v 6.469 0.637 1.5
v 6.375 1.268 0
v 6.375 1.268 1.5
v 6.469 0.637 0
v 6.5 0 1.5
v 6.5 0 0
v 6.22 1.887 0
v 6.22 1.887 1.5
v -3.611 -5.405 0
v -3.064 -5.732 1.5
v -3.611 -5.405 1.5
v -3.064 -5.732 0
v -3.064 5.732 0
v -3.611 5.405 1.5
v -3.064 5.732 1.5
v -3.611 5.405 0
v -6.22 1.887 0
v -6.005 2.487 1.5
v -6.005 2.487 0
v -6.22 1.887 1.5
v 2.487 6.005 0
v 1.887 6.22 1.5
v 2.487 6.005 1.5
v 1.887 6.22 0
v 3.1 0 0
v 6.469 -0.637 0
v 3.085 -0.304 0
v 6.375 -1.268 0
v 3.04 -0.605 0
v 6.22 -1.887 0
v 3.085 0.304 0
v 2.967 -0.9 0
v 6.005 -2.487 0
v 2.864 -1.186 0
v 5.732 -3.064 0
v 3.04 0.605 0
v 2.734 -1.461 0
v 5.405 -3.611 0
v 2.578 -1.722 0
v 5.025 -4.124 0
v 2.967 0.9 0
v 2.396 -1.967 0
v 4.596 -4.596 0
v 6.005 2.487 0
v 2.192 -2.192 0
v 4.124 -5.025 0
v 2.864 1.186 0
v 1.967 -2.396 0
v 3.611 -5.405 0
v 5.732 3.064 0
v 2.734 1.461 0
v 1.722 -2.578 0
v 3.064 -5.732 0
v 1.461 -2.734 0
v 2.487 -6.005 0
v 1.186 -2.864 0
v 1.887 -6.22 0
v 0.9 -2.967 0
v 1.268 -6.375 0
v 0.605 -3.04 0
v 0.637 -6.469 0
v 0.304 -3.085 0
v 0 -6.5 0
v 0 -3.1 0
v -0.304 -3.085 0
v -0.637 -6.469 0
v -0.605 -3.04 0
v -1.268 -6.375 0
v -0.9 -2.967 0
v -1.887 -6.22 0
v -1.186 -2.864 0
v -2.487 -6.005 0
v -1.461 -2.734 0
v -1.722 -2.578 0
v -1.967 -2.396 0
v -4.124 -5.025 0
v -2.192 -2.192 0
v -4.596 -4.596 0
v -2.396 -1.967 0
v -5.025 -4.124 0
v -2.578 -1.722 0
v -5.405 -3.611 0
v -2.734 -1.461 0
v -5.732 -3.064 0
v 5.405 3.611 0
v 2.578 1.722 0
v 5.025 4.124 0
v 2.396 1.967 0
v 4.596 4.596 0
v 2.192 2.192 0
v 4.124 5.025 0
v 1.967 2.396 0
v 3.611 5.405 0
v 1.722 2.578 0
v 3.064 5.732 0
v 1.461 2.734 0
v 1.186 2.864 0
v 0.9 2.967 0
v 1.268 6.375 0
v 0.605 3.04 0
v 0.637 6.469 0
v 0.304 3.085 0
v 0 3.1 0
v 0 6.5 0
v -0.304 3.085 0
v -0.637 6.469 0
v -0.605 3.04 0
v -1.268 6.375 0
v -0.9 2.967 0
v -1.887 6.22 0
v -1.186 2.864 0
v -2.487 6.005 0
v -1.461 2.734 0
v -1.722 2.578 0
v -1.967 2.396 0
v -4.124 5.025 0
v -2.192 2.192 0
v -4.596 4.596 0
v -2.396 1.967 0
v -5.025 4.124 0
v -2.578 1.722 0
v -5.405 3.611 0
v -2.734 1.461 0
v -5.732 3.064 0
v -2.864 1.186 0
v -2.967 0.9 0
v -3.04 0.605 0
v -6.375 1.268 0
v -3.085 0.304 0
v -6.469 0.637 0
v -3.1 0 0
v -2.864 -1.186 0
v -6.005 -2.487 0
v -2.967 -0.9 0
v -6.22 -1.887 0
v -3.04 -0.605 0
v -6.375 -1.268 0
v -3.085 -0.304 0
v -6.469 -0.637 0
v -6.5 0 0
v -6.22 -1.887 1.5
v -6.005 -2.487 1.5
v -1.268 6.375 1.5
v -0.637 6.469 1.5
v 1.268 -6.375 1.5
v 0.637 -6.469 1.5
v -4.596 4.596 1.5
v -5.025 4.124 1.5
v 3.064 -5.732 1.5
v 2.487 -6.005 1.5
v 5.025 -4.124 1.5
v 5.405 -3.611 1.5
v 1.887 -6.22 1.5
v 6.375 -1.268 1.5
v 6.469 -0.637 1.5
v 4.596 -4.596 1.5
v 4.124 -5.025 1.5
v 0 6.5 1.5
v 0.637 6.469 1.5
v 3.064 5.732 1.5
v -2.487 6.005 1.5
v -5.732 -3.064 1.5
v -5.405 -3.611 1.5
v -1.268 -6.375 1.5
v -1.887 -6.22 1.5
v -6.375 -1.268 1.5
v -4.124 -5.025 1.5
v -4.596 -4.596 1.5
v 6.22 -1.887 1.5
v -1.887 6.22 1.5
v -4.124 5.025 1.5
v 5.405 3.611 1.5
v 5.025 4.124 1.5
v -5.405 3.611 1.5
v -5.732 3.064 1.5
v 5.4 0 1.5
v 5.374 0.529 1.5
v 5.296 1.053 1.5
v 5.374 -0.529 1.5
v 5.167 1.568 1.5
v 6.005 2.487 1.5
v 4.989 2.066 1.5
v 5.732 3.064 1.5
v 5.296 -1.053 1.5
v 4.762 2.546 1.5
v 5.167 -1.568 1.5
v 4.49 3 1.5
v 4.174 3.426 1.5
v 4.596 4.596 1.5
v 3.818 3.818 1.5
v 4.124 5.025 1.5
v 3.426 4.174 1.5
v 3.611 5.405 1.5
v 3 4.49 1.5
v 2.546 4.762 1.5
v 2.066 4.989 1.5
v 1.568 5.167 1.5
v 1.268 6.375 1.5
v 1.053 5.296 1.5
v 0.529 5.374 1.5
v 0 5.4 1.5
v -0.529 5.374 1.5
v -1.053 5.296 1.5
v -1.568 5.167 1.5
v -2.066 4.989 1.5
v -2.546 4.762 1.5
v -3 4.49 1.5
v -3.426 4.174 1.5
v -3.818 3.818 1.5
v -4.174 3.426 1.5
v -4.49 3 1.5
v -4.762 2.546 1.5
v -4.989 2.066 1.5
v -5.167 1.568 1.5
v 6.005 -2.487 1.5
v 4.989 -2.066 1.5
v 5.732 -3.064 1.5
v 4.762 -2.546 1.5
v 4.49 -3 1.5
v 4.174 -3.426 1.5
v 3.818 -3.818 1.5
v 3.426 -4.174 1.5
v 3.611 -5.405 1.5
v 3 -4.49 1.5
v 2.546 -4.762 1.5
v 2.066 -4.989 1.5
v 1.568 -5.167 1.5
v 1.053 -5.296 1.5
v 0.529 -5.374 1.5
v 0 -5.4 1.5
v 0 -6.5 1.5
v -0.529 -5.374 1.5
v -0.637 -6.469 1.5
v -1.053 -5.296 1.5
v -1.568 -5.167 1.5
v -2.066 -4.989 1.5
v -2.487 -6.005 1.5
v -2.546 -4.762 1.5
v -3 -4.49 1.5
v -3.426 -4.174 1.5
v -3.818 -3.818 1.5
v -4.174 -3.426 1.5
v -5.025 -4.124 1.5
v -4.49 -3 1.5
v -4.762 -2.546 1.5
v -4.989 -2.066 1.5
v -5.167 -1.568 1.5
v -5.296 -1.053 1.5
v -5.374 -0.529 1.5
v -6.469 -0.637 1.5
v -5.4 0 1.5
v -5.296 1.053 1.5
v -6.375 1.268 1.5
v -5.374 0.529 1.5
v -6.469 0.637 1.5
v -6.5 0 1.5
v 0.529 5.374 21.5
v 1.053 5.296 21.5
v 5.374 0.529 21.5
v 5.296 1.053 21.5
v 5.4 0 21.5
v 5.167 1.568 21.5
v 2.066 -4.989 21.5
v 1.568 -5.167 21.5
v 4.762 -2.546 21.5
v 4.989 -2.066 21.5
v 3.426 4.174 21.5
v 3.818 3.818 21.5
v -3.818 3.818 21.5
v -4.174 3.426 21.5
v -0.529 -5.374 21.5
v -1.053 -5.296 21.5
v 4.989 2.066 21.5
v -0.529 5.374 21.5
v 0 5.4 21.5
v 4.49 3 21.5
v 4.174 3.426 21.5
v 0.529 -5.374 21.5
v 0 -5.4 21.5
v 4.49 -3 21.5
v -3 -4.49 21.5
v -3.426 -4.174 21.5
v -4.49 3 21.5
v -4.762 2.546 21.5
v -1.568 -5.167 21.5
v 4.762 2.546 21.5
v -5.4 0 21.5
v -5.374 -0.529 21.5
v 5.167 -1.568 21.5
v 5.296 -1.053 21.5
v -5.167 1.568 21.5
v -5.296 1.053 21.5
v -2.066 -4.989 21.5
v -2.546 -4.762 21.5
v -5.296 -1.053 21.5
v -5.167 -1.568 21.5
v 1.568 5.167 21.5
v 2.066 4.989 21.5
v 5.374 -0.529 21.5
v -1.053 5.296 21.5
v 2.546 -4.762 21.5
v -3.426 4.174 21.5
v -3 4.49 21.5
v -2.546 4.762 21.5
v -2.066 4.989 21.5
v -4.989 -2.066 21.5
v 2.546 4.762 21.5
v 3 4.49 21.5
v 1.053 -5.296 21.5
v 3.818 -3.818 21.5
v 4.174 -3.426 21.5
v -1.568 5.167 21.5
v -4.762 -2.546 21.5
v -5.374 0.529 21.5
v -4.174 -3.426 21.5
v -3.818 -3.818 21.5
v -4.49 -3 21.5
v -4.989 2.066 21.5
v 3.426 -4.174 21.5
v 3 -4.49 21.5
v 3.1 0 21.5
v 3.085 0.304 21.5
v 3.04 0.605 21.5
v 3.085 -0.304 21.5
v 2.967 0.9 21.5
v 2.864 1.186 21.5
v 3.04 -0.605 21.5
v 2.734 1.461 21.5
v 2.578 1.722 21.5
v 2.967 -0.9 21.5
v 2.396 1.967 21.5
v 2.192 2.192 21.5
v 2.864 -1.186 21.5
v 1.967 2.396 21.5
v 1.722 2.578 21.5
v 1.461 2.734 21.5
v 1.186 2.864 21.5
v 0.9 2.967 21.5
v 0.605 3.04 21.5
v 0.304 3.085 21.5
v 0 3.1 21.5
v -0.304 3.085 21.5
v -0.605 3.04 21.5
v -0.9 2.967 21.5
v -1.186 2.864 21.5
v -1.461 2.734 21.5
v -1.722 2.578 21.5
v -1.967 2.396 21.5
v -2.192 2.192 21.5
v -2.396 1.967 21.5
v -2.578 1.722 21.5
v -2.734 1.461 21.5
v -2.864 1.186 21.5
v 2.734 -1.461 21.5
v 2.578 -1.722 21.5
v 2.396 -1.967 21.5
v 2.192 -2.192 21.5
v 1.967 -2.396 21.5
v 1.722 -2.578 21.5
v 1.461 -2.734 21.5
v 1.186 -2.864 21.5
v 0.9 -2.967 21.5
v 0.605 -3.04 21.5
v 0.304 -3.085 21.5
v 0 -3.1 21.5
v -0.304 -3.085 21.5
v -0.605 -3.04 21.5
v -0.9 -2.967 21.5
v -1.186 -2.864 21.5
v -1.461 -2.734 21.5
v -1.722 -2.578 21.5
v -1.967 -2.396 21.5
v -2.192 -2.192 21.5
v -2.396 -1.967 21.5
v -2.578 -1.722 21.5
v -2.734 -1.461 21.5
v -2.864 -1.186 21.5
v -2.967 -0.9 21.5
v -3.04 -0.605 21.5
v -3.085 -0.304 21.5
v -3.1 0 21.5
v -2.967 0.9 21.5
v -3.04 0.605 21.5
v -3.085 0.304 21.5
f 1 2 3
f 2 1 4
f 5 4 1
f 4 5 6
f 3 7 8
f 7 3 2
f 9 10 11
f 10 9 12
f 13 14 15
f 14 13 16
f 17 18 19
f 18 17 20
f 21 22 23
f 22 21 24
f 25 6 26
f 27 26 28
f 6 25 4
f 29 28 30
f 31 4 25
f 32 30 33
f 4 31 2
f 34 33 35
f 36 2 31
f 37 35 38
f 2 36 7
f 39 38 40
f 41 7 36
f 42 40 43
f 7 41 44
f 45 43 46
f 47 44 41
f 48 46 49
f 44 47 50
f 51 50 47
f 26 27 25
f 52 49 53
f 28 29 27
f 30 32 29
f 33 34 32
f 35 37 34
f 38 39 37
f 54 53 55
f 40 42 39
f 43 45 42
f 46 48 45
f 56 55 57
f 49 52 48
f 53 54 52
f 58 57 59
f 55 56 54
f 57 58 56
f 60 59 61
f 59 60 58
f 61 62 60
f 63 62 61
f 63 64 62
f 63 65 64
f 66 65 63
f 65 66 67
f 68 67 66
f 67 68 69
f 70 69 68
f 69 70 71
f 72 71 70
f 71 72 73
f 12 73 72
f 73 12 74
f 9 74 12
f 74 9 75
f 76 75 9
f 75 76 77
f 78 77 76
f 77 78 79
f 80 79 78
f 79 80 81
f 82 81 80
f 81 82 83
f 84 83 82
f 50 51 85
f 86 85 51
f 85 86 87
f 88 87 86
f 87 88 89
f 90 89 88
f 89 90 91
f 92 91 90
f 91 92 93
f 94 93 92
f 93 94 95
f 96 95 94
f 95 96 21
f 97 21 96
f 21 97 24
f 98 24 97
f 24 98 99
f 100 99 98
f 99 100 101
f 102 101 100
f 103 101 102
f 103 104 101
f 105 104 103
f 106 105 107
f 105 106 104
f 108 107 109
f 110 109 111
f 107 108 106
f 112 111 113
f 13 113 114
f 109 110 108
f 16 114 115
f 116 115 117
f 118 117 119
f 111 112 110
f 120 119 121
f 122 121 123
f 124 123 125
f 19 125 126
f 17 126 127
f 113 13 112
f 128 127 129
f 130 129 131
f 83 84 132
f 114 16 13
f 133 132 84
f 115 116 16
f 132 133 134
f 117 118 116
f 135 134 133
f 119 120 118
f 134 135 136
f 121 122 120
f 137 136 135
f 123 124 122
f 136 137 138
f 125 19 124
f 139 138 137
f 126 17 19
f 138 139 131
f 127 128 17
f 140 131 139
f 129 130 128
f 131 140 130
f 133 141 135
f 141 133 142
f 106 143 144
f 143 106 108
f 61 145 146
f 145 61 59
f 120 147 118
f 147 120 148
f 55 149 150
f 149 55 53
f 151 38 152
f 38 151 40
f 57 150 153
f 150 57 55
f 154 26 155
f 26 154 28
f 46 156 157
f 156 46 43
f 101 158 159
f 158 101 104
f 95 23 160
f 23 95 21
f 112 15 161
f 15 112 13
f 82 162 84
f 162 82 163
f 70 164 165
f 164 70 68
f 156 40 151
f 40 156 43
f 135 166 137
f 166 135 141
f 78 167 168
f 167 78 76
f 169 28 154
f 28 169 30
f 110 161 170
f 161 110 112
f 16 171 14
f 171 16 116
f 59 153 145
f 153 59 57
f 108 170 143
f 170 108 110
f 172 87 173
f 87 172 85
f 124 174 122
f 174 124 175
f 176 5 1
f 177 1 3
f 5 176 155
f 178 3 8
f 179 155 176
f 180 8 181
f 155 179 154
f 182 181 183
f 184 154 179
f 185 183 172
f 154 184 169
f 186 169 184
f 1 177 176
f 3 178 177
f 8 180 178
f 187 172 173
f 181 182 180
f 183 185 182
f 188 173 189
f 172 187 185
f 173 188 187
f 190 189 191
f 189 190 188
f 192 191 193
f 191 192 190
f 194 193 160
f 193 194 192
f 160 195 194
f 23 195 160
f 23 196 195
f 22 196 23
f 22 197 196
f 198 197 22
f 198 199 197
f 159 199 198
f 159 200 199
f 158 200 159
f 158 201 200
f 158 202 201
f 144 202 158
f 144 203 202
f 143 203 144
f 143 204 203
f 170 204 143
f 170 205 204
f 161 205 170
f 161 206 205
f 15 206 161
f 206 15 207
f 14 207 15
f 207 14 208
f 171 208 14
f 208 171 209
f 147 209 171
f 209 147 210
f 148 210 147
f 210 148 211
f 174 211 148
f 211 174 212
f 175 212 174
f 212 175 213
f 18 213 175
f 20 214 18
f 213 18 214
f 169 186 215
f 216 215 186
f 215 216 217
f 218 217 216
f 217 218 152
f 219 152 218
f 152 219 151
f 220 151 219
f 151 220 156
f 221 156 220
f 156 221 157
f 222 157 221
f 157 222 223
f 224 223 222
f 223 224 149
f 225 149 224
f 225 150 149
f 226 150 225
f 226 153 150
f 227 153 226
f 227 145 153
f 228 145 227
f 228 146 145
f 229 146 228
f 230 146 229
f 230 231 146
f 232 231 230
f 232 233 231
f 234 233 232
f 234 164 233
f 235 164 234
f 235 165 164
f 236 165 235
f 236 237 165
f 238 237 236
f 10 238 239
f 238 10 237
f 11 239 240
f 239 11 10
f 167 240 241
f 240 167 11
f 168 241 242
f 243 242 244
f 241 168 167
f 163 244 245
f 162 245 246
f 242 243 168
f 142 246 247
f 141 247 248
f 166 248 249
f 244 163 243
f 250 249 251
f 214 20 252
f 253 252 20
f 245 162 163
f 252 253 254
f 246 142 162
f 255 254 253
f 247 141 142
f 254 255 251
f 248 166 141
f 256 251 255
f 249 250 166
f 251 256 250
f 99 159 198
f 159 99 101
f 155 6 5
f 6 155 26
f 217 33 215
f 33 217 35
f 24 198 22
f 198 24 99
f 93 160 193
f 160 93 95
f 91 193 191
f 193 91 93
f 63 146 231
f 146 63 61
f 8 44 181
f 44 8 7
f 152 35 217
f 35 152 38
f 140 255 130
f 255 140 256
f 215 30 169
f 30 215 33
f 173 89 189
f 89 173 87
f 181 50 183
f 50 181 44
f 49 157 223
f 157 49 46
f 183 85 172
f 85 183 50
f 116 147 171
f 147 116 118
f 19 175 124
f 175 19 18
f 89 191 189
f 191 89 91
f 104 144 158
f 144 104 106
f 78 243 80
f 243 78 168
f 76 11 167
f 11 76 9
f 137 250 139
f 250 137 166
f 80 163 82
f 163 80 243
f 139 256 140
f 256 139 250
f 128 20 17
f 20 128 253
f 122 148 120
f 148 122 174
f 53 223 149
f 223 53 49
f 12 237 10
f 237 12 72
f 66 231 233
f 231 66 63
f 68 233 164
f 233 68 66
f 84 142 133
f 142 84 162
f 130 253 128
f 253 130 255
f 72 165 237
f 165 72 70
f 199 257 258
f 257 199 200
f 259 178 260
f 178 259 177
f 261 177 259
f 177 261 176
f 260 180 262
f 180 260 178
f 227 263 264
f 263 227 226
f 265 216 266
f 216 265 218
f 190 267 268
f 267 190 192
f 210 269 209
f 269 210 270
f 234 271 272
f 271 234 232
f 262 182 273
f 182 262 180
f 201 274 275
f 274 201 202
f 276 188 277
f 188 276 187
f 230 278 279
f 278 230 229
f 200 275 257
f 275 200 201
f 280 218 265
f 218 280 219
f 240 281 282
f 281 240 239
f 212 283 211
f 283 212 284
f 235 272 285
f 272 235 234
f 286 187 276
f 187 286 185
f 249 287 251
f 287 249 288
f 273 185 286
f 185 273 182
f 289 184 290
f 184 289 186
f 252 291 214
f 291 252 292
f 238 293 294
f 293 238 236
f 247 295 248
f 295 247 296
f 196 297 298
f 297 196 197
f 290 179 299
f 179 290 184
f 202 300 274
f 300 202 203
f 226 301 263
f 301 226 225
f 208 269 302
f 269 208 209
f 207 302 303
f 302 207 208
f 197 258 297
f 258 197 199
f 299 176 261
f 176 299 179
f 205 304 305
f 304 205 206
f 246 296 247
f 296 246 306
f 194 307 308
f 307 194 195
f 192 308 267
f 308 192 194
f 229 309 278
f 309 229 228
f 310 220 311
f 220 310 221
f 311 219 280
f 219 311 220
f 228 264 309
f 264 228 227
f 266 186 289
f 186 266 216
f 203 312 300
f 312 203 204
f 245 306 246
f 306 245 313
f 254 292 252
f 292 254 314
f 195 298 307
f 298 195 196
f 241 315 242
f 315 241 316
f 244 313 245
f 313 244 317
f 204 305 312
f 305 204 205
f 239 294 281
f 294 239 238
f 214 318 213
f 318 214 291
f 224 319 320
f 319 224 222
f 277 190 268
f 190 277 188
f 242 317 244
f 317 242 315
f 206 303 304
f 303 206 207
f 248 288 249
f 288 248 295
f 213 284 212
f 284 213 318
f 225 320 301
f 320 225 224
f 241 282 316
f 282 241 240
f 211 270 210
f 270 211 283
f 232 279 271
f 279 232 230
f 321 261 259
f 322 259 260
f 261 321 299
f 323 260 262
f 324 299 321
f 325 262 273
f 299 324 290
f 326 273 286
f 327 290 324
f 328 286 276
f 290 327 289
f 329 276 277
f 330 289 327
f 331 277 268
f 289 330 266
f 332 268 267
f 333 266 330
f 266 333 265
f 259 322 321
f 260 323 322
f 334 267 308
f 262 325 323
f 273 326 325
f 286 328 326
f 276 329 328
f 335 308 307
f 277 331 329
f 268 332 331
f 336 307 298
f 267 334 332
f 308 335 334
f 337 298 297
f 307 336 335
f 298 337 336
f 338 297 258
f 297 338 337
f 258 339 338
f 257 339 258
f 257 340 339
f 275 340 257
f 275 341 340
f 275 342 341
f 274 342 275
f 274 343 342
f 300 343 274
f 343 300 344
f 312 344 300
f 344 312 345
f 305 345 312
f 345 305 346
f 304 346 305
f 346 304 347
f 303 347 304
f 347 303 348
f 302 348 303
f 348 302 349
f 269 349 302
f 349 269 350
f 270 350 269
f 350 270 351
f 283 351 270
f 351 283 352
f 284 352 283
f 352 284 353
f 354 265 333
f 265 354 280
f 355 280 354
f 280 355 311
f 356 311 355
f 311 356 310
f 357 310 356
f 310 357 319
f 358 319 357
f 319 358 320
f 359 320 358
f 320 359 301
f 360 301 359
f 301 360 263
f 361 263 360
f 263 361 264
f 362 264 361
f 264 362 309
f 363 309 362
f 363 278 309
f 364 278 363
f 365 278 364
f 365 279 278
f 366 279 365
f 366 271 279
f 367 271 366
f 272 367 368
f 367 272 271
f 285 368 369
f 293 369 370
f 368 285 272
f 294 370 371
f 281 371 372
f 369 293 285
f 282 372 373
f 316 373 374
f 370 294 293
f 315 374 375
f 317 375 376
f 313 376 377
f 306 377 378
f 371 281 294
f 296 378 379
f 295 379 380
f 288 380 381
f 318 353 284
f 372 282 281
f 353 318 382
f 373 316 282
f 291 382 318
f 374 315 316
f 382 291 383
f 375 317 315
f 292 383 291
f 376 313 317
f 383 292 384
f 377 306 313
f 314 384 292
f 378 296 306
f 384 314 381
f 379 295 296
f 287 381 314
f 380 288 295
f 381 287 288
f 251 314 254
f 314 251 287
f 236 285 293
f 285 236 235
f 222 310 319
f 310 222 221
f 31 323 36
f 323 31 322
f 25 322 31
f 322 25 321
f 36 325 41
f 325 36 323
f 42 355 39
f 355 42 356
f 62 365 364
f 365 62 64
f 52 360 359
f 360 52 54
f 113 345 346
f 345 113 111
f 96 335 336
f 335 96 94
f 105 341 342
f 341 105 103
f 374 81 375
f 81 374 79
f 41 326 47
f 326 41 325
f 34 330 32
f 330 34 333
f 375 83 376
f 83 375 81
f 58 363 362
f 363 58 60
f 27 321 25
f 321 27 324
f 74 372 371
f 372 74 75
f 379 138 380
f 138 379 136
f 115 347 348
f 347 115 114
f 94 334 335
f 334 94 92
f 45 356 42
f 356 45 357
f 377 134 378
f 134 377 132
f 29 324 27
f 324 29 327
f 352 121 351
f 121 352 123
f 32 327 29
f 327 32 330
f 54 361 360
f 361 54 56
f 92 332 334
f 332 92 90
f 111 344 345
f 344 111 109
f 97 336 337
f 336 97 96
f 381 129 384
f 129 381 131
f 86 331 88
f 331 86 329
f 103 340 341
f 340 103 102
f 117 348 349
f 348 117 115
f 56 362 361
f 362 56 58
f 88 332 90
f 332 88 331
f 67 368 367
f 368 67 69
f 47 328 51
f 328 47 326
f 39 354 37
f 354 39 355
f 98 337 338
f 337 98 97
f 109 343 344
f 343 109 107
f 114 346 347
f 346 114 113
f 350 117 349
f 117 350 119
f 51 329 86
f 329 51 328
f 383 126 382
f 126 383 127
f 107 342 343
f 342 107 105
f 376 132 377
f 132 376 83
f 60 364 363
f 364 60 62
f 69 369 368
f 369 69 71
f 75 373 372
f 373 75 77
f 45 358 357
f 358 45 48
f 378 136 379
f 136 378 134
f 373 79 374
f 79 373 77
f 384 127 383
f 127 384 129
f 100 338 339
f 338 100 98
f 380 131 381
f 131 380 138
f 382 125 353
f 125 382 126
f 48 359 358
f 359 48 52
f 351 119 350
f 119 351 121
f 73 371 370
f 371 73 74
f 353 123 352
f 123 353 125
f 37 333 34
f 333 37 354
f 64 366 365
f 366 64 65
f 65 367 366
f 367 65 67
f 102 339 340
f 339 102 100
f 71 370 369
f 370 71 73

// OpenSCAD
// Adapter sleeve: 0.2 mL PCR tube for a 1.5 mL tube rack hole
// Print orientation: collar down on the bed (z = 0), sleeve up (+Z)

$fn = 64;

// ---- Dimensions (mm) ----
collar_d      = 13;    // collar outer diameter
collar_h      = 1.5;   // collar thickness (z = 0 to 1.5)
sleeve_od     = 10.8;  // sleeve body outer diameter
sleeve_top_z  = 21.5;  // top of sleeve body (z)
bore_d        = 6.2;   // straight through-bore diameter
eps           = 0.5;   // cutter overshoot past faces

// ---- Model ----
difference() {
    union() {
        // Collar
        cylinder(d = collar_d, h = collar_h);
        // Sleeve body (overlaps slightly into collar for a clean union)
        translate([0, 0, collar_h - 0.01])
            cylinder(d = sleeve_od, h = sleeve_top_z - collar_h + 0.01);
    }
    // Full-height bore, open at both ends
    translate([0, 0, -eps])
        cylinder(d = bore_d, h = sleeve_top_z + 2 * eps);
}
